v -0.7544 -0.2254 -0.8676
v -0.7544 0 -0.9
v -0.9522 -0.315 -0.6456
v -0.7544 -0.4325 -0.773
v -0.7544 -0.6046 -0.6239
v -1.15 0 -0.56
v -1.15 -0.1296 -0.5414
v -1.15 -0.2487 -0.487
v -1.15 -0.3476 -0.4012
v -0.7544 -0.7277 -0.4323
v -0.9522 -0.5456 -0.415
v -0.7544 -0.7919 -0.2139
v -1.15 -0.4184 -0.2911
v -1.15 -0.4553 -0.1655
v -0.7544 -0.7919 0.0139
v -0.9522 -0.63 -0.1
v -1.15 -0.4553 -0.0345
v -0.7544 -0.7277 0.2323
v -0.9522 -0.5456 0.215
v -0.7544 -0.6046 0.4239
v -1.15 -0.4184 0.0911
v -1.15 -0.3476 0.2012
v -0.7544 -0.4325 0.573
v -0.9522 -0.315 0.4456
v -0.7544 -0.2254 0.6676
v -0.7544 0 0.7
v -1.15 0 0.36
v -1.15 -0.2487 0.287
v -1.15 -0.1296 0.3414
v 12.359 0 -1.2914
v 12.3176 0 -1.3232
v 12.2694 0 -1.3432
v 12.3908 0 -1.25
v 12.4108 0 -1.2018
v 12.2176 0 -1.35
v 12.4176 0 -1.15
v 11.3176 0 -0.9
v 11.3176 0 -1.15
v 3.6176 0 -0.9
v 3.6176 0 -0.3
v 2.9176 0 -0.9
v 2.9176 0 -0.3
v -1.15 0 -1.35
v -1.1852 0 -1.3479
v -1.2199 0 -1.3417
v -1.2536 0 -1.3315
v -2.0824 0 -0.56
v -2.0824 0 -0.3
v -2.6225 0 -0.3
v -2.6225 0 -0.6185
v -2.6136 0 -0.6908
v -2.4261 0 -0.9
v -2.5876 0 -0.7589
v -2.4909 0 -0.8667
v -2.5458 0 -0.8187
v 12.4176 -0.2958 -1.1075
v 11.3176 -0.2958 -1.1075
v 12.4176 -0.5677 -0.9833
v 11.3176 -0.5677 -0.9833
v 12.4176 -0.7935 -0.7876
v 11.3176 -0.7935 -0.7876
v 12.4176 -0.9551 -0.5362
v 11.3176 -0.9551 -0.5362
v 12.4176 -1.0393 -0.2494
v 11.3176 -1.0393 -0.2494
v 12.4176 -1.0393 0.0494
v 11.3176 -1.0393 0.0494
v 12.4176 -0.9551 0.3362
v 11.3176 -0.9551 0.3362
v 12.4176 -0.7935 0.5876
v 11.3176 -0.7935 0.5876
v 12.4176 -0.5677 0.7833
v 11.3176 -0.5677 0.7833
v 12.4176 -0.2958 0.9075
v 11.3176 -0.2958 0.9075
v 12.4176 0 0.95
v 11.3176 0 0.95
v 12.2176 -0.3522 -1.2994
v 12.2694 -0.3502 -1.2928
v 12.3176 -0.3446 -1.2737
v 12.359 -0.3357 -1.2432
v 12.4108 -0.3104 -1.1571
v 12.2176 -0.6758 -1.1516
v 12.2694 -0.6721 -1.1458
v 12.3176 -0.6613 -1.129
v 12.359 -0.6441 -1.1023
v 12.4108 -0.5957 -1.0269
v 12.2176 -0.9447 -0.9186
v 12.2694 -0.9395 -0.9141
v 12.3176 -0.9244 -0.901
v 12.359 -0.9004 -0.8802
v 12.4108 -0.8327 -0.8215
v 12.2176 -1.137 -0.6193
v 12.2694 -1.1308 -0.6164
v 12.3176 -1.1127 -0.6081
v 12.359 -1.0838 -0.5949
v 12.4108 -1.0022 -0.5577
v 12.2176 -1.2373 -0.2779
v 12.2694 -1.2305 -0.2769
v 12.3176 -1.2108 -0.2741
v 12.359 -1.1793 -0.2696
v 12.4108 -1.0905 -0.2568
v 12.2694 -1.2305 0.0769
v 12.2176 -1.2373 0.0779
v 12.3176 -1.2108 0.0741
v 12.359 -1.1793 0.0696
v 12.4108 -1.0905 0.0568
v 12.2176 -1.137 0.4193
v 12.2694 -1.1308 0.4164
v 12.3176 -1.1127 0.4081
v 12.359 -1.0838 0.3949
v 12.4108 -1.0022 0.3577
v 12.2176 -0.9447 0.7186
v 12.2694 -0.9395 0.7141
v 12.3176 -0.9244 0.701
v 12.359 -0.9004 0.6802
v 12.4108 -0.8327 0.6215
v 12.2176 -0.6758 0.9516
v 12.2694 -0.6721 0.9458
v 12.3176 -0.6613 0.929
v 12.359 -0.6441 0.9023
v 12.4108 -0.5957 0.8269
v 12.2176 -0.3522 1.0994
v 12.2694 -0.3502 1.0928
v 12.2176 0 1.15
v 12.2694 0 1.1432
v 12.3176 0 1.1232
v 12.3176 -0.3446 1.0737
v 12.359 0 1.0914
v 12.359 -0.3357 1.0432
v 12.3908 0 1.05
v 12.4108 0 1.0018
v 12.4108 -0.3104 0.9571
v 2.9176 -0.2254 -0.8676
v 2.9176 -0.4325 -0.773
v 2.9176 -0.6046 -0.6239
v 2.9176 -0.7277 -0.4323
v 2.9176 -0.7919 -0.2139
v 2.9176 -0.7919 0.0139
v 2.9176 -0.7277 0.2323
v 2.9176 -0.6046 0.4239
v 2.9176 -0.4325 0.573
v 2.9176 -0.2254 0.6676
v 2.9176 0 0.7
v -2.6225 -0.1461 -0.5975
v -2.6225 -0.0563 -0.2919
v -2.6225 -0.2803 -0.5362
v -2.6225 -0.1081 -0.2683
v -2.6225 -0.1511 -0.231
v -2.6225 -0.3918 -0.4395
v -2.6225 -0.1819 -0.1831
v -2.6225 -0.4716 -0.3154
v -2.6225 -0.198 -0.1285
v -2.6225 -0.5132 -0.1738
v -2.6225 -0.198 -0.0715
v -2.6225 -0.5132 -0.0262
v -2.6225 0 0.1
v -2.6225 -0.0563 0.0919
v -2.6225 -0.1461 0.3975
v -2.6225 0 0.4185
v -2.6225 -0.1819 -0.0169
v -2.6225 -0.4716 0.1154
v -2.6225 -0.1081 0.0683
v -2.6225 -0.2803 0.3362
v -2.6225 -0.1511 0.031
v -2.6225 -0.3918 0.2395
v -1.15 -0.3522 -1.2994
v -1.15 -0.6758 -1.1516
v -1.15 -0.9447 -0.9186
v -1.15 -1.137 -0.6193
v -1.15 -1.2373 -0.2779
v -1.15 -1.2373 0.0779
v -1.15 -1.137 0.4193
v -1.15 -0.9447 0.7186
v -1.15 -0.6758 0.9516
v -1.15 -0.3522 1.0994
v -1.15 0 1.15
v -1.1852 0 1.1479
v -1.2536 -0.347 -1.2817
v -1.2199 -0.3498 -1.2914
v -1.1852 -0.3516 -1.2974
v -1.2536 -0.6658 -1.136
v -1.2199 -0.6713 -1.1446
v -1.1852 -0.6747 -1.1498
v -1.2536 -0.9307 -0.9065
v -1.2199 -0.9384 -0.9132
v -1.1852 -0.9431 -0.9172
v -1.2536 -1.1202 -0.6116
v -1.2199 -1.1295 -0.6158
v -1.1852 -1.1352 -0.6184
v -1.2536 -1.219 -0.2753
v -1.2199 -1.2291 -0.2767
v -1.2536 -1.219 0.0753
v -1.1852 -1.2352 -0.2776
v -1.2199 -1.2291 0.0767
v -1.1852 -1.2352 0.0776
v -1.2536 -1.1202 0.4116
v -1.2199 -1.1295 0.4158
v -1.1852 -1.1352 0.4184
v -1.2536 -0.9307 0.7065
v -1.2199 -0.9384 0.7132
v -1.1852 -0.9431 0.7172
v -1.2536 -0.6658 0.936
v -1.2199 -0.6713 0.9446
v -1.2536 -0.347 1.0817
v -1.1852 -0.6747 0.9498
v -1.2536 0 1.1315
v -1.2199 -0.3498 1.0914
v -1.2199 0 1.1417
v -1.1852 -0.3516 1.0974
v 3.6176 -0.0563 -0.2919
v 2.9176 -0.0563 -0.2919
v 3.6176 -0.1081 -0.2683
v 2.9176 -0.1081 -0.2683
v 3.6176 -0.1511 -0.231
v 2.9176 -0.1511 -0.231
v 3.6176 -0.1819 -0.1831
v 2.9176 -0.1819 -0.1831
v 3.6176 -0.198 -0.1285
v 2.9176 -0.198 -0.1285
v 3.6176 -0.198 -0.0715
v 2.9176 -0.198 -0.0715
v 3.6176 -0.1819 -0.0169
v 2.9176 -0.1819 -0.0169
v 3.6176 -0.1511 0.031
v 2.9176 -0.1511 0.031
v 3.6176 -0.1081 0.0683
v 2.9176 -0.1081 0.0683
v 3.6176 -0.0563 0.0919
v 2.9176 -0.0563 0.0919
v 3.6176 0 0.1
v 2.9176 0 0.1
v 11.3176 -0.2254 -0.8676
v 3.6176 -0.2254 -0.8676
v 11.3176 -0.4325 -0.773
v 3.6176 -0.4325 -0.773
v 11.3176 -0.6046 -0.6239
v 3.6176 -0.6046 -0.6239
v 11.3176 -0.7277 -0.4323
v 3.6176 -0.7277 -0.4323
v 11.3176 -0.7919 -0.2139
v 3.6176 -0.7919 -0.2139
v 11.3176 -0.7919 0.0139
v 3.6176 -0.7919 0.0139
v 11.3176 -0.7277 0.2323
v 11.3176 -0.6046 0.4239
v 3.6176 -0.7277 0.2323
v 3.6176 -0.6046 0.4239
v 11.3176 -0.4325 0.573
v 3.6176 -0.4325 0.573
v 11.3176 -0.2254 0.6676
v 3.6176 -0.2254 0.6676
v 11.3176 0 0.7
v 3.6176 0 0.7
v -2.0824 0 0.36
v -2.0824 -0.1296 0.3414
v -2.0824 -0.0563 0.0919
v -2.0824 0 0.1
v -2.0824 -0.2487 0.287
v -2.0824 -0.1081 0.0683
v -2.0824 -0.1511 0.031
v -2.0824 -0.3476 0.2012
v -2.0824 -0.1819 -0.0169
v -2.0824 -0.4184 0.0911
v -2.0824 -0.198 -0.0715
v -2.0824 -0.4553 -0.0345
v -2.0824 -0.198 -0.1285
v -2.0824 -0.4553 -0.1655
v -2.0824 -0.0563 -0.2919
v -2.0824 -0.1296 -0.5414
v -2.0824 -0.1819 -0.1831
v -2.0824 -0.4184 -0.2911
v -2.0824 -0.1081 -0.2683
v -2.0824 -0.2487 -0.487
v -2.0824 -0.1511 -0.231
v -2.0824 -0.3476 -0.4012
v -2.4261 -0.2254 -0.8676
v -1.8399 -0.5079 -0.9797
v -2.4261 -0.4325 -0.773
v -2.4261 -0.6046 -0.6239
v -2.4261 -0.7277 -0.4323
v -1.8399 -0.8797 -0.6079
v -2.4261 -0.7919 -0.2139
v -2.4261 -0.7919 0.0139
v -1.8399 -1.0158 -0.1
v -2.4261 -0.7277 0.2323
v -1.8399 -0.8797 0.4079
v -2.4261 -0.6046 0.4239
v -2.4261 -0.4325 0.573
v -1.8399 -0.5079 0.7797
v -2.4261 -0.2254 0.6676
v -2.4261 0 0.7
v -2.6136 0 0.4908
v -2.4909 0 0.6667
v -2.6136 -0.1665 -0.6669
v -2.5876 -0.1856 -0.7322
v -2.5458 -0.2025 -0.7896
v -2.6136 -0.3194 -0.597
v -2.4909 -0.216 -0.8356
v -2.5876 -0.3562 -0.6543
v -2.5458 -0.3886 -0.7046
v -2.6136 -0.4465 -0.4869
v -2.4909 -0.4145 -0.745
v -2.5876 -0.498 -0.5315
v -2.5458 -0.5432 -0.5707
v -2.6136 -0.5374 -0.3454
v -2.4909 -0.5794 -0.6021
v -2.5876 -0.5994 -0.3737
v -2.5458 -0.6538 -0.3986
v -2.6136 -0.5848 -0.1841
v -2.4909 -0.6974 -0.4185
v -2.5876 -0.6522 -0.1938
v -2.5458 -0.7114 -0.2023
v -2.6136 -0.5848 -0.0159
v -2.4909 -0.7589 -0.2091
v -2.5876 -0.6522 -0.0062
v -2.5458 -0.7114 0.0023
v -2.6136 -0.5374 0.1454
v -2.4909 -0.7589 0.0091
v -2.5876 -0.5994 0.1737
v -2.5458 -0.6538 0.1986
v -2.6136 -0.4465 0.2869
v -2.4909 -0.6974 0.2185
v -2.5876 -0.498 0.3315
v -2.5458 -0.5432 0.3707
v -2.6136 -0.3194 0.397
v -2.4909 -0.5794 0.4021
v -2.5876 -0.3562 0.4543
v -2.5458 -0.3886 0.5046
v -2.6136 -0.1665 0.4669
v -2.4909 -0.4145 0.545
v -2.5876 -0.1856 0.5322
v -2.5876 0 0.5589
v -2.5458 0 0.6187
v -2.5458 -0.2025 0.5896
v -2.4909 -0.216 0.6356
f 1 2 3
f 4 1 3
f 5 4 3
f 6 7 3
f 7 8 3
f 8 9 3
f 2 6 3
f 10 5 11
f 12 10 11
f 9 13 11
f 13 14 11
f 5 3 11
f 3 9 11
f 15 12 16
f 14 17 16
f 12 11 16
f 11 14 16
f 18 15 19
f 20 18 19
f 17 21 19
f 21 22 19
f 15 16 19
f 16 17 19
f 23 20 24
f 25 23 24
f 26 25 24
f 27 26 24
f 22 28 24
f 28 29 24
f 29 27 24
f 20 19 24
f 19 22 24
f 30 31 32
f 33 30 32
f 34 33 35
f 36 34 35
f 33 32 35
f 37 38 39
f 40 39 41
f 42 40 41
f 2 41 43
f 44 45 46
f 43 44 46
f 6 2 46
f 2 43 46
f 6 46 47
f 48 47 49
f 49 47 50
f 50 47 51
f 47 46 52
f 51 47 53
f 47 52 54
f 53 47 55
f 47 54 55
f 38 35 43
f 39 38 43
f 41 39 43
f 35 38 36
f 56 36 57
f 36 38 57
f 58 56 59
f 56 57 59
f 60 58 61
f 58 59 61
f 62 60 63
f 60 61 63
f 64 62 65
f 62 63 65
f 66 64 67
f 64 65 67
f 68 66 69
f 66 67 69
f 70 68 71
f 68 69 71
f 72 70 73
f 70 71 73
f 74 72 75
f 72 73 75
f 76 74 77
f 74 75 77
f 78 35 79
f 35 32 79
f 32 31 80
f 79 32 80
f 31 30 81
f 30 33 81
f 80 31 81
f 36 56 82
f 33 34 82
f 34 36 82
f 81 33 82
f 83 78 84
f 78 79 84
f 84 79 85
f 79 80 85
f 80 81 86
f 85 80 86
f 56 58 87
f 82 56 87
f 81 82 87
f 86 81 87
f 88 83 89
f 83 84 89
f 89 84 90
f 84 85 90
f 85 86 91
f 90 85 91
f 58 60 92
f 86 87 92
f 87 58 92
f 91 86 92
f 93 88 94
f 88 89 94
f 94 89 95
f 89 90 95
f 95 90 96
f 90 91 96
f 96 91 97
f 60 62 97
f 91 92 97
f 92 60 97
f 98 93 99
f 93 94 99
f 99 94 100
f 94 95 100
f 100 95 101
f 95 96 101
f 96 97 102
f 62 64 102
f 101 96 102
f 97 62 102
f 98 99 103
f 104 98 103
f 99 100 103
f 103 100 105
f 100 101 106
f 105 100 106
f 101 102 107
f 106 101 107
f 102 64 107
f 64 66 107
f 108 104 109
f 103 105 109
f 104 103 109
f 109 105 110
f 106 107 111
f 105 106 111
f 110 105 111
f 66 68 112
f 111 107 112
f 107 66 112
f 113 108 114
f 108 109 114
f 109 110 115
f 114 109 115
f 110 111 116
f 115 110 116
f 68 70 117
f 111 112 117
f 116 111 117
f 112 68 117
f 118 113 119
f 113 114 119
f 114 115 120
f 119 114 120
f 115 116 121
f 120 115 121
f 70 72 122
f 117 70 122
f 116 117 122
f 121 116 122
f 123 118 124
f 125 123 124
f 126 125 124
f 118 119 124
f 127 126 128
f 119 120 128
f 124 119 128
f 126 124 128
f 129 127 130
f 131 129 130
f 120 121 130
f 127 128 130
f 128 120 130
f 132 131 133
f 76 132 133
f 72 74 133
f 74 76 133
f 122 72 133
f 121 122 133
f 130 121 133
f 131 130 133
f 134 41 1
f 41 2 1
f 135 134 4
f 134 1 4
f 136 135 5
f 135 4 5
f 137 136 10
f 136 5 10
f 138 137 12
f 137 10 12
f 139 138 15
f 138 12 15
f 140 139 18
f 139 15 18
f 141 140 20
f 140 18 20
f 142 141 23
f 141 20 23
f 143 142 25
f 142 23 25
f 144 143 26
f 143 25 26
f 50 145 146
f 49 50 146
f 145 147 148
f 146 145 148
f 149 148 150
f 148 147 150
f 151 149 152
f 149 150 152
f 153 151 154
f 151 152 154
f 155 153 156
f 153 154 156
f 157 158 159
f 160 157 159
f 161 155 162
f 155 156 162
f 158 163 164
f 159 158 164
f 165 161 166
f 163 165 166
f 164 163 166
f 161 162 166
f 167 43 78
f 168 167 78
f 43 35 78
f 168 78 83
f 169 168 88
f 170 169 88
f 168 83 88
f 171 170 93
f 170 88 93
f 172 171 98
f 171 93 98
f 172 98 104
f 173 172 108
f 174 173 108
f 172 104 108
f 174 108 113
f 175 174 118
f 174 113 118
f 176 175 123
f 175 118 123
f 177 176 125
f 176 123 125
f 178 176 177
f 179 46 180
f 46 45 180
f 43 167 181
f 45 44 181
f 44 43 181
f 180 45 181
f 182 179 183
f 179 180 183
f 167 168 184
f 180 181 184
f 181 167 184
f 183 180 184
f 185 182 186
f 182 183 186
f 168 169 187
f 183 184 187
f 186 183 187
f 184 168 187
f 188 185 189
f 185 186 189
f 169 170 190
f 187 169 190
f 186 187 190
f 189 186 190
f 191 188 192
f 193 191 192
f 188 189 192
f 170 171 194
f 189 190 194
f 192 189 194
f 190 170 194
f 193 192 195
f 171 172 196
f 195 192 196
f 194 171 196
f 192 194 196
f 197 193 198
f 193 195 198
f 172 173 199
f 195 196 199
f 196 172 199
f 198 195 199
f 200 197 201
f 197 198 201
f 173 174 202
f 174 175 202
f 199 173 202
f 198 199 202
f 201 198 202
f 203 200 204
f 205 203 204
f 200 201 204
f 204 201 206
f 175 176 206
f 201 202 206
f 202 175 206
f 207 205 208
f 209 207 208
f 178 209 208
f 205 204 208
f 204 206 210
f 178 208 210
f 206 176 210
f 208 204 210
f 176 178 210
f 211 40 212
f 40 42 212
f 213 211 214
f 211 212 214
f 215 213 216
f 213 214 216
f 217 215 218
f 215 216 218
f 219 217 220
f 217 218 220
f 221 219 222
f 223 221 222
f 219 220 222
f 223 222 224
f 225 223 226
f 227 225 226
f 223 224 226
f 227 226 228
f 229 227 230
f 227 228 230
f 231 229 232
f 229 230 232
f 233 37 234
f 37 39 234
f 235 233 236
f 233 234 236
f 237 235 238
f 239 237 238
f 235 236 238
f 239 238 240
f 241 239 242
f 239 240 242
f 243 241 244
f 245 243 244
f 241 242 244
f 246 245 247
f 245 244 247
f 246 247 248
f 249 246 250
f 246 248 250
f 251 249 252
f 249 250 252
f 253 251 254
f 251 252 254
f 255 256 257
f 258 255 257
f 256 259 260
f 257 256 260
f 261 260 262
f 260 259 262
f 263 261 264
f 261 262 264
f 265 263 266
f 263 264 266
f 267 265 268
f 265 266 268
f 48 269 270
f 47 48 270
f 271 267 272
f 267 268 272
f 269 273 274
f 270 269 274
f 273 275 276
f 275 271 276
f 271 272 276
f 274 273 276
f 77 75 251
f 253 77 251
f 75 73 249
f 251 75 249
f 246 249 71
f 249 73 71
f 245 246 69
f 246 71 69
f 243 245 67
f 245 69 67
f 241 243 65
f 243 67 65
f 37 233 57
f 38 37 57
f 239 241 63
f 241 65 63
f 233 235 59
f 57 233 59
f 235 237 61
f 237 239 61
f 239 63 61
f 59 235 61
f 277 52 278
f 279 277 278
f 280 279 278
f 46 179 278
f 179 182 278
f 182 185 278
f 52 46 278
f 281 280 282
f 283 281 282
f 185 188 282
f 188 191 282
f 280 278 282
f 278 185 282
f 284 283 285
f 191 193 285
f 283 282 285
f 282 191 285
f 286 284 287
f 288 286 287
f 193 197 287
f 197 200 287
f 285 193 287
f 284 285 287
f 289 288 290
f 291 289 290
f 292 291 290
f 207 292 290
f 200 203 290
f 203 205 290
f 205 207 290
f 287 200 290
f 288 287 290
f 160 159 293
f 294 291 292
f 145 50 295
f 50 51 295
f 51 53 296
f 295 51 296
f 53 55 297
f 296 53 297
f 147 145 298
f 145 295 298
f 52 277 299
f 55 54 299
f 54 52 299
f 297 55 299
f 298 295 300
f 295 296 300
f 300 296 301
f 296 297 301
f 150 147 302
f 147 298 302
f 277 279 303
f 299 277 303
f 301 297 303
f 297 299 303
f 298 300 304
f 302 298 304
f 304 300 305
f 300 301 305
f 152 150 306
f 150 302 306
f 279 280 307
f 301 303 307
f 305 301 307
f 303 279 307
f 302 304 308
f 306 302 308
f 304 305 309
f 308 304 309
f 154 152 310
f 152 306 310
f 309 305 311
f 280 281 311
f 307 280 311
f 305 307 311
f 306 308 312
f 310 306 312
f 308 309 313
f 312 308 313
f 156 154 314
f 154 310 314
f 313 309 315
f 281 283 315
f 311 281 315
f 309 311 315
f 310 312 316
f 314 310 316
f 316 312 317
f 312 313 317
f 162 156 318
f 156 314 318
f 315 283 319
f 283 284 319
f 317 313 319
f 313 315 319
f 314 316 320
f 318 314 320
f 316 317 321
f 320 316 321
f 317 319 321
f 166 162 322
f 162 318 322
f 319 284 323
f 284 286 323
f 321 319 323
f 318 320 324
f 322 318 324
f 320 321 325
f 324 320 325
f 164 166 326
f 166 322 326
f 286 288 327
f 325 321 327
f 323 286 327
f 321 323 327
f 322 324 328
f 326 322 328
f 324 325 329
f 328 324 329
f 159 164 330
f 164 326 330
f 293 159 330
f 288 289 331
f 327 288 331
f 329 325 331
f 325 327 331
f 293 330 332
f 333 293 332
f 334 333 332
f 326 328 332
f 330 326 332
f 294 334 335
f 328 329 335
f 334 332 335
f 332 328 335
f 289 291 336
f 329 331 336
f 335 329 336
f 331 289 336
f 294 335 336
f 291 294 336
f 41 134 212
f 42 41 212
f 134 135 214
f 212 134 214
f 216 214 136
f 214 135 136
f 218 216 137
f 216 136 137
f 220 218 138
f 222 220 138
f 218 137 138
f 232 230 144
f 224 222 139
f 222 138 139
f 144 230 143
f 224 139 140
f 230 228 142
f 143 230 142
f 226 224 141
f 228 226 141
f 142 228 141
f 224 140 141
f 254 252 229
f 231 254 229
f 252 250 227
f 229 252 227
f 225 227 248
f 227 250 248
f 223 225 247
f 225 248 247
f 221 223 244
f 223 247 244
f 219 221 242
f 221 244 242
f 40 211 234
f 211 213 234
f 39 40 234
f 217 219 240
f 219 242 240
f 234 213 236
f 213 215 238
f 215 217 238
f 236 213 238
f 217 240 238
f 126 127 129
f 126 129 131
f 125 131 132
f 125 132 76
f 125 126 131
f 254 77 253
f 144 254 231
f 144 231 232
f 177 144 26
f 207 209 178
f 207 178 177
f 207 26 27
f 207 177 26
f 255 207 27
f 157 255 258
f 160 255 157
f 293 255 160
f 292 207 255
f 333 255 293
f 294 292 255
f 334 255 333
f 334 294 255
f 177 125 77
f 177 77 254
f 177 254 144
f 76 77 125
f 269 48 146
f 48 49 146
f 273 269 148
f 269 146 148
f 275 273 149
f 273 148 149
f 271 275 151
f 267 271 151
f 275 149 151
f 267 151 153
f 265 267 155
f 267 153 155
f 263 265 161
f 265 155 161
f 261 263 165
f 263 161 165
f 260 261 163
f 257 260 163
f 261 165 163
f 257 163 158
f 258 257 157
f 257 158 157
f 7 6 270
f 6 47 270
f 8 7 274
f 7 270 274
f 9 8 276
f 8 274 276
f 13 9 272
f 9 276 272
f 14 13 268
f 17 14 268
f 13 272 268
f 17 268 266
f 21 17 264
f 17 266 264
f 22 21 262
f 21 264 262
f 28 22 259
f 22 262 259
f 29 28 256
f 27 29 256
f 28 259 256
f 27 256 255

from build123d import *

# Parameters (mm, degrees)
REVOLVE1_ANGLE = 180


with BuildPart() as part:
    # Sketch1 → Revolve1 (revolve)
    with BuildSketch(Plane(origin=(0, 0, 0), x_dir=(1, 0, 0), z_dir=(0, 1, 0))):
        with BuildLine():
            Line((-2.426089026, 0.9), (-1.253621619, 1.331536072))
            ThreePointArc((-1.253621619, 1.331536072), (-1.202626886, 1.345347949), (-1.15, 1.35))
            Line((-1.15, 1.35), (12.217609628, 1.35))
            ThreePointArc((12.217609628, 1.35), (12.359030984, 1.291421356), (12.417609628, 1.15))
            Line((12.417609628, 1.15), (11.317609628, 1.15))
            Line((11.317609628, 1.15), (11.317609628, 0.9))
            Line((11.317609628, 0.9), (3.617609628, 0.9))
            Line((3.617609628, 0.9), (3.617609628, 0.3))
            Line((3.617609628, 0.3), (2.917609628, 0.3))
            Line((2.917609628, 0.3), (2.917609628, 0.9))
            Line((2.917609628, 0.9), (-0.754449261, 0.9))
            Line((-0.754449261, 0.9), (-1.15, 0.56))
            Line((-1.15, 0.56), (-2.082390372, 0.56))
            Line((-2.082390372, 0.56), (-2.082390372, 0.3))
            Line((-2.082390372, 0.3), (-2.622467407, 0.3))
            Line((-2.622467407, 0.3), (-2.622467407, 0.618463928))
            ThreePointArc((-2.622467407, 0.618463928), (-2.568522772, 0.790093637), (-2.426089026, 0.9))
        make_face()
    revolve(axis=Axis((-3.185032955, 0, -0.1), (-1, 0, 0)), revolution_arc=REVOLVE1_ANGLE)


solid = part.part
